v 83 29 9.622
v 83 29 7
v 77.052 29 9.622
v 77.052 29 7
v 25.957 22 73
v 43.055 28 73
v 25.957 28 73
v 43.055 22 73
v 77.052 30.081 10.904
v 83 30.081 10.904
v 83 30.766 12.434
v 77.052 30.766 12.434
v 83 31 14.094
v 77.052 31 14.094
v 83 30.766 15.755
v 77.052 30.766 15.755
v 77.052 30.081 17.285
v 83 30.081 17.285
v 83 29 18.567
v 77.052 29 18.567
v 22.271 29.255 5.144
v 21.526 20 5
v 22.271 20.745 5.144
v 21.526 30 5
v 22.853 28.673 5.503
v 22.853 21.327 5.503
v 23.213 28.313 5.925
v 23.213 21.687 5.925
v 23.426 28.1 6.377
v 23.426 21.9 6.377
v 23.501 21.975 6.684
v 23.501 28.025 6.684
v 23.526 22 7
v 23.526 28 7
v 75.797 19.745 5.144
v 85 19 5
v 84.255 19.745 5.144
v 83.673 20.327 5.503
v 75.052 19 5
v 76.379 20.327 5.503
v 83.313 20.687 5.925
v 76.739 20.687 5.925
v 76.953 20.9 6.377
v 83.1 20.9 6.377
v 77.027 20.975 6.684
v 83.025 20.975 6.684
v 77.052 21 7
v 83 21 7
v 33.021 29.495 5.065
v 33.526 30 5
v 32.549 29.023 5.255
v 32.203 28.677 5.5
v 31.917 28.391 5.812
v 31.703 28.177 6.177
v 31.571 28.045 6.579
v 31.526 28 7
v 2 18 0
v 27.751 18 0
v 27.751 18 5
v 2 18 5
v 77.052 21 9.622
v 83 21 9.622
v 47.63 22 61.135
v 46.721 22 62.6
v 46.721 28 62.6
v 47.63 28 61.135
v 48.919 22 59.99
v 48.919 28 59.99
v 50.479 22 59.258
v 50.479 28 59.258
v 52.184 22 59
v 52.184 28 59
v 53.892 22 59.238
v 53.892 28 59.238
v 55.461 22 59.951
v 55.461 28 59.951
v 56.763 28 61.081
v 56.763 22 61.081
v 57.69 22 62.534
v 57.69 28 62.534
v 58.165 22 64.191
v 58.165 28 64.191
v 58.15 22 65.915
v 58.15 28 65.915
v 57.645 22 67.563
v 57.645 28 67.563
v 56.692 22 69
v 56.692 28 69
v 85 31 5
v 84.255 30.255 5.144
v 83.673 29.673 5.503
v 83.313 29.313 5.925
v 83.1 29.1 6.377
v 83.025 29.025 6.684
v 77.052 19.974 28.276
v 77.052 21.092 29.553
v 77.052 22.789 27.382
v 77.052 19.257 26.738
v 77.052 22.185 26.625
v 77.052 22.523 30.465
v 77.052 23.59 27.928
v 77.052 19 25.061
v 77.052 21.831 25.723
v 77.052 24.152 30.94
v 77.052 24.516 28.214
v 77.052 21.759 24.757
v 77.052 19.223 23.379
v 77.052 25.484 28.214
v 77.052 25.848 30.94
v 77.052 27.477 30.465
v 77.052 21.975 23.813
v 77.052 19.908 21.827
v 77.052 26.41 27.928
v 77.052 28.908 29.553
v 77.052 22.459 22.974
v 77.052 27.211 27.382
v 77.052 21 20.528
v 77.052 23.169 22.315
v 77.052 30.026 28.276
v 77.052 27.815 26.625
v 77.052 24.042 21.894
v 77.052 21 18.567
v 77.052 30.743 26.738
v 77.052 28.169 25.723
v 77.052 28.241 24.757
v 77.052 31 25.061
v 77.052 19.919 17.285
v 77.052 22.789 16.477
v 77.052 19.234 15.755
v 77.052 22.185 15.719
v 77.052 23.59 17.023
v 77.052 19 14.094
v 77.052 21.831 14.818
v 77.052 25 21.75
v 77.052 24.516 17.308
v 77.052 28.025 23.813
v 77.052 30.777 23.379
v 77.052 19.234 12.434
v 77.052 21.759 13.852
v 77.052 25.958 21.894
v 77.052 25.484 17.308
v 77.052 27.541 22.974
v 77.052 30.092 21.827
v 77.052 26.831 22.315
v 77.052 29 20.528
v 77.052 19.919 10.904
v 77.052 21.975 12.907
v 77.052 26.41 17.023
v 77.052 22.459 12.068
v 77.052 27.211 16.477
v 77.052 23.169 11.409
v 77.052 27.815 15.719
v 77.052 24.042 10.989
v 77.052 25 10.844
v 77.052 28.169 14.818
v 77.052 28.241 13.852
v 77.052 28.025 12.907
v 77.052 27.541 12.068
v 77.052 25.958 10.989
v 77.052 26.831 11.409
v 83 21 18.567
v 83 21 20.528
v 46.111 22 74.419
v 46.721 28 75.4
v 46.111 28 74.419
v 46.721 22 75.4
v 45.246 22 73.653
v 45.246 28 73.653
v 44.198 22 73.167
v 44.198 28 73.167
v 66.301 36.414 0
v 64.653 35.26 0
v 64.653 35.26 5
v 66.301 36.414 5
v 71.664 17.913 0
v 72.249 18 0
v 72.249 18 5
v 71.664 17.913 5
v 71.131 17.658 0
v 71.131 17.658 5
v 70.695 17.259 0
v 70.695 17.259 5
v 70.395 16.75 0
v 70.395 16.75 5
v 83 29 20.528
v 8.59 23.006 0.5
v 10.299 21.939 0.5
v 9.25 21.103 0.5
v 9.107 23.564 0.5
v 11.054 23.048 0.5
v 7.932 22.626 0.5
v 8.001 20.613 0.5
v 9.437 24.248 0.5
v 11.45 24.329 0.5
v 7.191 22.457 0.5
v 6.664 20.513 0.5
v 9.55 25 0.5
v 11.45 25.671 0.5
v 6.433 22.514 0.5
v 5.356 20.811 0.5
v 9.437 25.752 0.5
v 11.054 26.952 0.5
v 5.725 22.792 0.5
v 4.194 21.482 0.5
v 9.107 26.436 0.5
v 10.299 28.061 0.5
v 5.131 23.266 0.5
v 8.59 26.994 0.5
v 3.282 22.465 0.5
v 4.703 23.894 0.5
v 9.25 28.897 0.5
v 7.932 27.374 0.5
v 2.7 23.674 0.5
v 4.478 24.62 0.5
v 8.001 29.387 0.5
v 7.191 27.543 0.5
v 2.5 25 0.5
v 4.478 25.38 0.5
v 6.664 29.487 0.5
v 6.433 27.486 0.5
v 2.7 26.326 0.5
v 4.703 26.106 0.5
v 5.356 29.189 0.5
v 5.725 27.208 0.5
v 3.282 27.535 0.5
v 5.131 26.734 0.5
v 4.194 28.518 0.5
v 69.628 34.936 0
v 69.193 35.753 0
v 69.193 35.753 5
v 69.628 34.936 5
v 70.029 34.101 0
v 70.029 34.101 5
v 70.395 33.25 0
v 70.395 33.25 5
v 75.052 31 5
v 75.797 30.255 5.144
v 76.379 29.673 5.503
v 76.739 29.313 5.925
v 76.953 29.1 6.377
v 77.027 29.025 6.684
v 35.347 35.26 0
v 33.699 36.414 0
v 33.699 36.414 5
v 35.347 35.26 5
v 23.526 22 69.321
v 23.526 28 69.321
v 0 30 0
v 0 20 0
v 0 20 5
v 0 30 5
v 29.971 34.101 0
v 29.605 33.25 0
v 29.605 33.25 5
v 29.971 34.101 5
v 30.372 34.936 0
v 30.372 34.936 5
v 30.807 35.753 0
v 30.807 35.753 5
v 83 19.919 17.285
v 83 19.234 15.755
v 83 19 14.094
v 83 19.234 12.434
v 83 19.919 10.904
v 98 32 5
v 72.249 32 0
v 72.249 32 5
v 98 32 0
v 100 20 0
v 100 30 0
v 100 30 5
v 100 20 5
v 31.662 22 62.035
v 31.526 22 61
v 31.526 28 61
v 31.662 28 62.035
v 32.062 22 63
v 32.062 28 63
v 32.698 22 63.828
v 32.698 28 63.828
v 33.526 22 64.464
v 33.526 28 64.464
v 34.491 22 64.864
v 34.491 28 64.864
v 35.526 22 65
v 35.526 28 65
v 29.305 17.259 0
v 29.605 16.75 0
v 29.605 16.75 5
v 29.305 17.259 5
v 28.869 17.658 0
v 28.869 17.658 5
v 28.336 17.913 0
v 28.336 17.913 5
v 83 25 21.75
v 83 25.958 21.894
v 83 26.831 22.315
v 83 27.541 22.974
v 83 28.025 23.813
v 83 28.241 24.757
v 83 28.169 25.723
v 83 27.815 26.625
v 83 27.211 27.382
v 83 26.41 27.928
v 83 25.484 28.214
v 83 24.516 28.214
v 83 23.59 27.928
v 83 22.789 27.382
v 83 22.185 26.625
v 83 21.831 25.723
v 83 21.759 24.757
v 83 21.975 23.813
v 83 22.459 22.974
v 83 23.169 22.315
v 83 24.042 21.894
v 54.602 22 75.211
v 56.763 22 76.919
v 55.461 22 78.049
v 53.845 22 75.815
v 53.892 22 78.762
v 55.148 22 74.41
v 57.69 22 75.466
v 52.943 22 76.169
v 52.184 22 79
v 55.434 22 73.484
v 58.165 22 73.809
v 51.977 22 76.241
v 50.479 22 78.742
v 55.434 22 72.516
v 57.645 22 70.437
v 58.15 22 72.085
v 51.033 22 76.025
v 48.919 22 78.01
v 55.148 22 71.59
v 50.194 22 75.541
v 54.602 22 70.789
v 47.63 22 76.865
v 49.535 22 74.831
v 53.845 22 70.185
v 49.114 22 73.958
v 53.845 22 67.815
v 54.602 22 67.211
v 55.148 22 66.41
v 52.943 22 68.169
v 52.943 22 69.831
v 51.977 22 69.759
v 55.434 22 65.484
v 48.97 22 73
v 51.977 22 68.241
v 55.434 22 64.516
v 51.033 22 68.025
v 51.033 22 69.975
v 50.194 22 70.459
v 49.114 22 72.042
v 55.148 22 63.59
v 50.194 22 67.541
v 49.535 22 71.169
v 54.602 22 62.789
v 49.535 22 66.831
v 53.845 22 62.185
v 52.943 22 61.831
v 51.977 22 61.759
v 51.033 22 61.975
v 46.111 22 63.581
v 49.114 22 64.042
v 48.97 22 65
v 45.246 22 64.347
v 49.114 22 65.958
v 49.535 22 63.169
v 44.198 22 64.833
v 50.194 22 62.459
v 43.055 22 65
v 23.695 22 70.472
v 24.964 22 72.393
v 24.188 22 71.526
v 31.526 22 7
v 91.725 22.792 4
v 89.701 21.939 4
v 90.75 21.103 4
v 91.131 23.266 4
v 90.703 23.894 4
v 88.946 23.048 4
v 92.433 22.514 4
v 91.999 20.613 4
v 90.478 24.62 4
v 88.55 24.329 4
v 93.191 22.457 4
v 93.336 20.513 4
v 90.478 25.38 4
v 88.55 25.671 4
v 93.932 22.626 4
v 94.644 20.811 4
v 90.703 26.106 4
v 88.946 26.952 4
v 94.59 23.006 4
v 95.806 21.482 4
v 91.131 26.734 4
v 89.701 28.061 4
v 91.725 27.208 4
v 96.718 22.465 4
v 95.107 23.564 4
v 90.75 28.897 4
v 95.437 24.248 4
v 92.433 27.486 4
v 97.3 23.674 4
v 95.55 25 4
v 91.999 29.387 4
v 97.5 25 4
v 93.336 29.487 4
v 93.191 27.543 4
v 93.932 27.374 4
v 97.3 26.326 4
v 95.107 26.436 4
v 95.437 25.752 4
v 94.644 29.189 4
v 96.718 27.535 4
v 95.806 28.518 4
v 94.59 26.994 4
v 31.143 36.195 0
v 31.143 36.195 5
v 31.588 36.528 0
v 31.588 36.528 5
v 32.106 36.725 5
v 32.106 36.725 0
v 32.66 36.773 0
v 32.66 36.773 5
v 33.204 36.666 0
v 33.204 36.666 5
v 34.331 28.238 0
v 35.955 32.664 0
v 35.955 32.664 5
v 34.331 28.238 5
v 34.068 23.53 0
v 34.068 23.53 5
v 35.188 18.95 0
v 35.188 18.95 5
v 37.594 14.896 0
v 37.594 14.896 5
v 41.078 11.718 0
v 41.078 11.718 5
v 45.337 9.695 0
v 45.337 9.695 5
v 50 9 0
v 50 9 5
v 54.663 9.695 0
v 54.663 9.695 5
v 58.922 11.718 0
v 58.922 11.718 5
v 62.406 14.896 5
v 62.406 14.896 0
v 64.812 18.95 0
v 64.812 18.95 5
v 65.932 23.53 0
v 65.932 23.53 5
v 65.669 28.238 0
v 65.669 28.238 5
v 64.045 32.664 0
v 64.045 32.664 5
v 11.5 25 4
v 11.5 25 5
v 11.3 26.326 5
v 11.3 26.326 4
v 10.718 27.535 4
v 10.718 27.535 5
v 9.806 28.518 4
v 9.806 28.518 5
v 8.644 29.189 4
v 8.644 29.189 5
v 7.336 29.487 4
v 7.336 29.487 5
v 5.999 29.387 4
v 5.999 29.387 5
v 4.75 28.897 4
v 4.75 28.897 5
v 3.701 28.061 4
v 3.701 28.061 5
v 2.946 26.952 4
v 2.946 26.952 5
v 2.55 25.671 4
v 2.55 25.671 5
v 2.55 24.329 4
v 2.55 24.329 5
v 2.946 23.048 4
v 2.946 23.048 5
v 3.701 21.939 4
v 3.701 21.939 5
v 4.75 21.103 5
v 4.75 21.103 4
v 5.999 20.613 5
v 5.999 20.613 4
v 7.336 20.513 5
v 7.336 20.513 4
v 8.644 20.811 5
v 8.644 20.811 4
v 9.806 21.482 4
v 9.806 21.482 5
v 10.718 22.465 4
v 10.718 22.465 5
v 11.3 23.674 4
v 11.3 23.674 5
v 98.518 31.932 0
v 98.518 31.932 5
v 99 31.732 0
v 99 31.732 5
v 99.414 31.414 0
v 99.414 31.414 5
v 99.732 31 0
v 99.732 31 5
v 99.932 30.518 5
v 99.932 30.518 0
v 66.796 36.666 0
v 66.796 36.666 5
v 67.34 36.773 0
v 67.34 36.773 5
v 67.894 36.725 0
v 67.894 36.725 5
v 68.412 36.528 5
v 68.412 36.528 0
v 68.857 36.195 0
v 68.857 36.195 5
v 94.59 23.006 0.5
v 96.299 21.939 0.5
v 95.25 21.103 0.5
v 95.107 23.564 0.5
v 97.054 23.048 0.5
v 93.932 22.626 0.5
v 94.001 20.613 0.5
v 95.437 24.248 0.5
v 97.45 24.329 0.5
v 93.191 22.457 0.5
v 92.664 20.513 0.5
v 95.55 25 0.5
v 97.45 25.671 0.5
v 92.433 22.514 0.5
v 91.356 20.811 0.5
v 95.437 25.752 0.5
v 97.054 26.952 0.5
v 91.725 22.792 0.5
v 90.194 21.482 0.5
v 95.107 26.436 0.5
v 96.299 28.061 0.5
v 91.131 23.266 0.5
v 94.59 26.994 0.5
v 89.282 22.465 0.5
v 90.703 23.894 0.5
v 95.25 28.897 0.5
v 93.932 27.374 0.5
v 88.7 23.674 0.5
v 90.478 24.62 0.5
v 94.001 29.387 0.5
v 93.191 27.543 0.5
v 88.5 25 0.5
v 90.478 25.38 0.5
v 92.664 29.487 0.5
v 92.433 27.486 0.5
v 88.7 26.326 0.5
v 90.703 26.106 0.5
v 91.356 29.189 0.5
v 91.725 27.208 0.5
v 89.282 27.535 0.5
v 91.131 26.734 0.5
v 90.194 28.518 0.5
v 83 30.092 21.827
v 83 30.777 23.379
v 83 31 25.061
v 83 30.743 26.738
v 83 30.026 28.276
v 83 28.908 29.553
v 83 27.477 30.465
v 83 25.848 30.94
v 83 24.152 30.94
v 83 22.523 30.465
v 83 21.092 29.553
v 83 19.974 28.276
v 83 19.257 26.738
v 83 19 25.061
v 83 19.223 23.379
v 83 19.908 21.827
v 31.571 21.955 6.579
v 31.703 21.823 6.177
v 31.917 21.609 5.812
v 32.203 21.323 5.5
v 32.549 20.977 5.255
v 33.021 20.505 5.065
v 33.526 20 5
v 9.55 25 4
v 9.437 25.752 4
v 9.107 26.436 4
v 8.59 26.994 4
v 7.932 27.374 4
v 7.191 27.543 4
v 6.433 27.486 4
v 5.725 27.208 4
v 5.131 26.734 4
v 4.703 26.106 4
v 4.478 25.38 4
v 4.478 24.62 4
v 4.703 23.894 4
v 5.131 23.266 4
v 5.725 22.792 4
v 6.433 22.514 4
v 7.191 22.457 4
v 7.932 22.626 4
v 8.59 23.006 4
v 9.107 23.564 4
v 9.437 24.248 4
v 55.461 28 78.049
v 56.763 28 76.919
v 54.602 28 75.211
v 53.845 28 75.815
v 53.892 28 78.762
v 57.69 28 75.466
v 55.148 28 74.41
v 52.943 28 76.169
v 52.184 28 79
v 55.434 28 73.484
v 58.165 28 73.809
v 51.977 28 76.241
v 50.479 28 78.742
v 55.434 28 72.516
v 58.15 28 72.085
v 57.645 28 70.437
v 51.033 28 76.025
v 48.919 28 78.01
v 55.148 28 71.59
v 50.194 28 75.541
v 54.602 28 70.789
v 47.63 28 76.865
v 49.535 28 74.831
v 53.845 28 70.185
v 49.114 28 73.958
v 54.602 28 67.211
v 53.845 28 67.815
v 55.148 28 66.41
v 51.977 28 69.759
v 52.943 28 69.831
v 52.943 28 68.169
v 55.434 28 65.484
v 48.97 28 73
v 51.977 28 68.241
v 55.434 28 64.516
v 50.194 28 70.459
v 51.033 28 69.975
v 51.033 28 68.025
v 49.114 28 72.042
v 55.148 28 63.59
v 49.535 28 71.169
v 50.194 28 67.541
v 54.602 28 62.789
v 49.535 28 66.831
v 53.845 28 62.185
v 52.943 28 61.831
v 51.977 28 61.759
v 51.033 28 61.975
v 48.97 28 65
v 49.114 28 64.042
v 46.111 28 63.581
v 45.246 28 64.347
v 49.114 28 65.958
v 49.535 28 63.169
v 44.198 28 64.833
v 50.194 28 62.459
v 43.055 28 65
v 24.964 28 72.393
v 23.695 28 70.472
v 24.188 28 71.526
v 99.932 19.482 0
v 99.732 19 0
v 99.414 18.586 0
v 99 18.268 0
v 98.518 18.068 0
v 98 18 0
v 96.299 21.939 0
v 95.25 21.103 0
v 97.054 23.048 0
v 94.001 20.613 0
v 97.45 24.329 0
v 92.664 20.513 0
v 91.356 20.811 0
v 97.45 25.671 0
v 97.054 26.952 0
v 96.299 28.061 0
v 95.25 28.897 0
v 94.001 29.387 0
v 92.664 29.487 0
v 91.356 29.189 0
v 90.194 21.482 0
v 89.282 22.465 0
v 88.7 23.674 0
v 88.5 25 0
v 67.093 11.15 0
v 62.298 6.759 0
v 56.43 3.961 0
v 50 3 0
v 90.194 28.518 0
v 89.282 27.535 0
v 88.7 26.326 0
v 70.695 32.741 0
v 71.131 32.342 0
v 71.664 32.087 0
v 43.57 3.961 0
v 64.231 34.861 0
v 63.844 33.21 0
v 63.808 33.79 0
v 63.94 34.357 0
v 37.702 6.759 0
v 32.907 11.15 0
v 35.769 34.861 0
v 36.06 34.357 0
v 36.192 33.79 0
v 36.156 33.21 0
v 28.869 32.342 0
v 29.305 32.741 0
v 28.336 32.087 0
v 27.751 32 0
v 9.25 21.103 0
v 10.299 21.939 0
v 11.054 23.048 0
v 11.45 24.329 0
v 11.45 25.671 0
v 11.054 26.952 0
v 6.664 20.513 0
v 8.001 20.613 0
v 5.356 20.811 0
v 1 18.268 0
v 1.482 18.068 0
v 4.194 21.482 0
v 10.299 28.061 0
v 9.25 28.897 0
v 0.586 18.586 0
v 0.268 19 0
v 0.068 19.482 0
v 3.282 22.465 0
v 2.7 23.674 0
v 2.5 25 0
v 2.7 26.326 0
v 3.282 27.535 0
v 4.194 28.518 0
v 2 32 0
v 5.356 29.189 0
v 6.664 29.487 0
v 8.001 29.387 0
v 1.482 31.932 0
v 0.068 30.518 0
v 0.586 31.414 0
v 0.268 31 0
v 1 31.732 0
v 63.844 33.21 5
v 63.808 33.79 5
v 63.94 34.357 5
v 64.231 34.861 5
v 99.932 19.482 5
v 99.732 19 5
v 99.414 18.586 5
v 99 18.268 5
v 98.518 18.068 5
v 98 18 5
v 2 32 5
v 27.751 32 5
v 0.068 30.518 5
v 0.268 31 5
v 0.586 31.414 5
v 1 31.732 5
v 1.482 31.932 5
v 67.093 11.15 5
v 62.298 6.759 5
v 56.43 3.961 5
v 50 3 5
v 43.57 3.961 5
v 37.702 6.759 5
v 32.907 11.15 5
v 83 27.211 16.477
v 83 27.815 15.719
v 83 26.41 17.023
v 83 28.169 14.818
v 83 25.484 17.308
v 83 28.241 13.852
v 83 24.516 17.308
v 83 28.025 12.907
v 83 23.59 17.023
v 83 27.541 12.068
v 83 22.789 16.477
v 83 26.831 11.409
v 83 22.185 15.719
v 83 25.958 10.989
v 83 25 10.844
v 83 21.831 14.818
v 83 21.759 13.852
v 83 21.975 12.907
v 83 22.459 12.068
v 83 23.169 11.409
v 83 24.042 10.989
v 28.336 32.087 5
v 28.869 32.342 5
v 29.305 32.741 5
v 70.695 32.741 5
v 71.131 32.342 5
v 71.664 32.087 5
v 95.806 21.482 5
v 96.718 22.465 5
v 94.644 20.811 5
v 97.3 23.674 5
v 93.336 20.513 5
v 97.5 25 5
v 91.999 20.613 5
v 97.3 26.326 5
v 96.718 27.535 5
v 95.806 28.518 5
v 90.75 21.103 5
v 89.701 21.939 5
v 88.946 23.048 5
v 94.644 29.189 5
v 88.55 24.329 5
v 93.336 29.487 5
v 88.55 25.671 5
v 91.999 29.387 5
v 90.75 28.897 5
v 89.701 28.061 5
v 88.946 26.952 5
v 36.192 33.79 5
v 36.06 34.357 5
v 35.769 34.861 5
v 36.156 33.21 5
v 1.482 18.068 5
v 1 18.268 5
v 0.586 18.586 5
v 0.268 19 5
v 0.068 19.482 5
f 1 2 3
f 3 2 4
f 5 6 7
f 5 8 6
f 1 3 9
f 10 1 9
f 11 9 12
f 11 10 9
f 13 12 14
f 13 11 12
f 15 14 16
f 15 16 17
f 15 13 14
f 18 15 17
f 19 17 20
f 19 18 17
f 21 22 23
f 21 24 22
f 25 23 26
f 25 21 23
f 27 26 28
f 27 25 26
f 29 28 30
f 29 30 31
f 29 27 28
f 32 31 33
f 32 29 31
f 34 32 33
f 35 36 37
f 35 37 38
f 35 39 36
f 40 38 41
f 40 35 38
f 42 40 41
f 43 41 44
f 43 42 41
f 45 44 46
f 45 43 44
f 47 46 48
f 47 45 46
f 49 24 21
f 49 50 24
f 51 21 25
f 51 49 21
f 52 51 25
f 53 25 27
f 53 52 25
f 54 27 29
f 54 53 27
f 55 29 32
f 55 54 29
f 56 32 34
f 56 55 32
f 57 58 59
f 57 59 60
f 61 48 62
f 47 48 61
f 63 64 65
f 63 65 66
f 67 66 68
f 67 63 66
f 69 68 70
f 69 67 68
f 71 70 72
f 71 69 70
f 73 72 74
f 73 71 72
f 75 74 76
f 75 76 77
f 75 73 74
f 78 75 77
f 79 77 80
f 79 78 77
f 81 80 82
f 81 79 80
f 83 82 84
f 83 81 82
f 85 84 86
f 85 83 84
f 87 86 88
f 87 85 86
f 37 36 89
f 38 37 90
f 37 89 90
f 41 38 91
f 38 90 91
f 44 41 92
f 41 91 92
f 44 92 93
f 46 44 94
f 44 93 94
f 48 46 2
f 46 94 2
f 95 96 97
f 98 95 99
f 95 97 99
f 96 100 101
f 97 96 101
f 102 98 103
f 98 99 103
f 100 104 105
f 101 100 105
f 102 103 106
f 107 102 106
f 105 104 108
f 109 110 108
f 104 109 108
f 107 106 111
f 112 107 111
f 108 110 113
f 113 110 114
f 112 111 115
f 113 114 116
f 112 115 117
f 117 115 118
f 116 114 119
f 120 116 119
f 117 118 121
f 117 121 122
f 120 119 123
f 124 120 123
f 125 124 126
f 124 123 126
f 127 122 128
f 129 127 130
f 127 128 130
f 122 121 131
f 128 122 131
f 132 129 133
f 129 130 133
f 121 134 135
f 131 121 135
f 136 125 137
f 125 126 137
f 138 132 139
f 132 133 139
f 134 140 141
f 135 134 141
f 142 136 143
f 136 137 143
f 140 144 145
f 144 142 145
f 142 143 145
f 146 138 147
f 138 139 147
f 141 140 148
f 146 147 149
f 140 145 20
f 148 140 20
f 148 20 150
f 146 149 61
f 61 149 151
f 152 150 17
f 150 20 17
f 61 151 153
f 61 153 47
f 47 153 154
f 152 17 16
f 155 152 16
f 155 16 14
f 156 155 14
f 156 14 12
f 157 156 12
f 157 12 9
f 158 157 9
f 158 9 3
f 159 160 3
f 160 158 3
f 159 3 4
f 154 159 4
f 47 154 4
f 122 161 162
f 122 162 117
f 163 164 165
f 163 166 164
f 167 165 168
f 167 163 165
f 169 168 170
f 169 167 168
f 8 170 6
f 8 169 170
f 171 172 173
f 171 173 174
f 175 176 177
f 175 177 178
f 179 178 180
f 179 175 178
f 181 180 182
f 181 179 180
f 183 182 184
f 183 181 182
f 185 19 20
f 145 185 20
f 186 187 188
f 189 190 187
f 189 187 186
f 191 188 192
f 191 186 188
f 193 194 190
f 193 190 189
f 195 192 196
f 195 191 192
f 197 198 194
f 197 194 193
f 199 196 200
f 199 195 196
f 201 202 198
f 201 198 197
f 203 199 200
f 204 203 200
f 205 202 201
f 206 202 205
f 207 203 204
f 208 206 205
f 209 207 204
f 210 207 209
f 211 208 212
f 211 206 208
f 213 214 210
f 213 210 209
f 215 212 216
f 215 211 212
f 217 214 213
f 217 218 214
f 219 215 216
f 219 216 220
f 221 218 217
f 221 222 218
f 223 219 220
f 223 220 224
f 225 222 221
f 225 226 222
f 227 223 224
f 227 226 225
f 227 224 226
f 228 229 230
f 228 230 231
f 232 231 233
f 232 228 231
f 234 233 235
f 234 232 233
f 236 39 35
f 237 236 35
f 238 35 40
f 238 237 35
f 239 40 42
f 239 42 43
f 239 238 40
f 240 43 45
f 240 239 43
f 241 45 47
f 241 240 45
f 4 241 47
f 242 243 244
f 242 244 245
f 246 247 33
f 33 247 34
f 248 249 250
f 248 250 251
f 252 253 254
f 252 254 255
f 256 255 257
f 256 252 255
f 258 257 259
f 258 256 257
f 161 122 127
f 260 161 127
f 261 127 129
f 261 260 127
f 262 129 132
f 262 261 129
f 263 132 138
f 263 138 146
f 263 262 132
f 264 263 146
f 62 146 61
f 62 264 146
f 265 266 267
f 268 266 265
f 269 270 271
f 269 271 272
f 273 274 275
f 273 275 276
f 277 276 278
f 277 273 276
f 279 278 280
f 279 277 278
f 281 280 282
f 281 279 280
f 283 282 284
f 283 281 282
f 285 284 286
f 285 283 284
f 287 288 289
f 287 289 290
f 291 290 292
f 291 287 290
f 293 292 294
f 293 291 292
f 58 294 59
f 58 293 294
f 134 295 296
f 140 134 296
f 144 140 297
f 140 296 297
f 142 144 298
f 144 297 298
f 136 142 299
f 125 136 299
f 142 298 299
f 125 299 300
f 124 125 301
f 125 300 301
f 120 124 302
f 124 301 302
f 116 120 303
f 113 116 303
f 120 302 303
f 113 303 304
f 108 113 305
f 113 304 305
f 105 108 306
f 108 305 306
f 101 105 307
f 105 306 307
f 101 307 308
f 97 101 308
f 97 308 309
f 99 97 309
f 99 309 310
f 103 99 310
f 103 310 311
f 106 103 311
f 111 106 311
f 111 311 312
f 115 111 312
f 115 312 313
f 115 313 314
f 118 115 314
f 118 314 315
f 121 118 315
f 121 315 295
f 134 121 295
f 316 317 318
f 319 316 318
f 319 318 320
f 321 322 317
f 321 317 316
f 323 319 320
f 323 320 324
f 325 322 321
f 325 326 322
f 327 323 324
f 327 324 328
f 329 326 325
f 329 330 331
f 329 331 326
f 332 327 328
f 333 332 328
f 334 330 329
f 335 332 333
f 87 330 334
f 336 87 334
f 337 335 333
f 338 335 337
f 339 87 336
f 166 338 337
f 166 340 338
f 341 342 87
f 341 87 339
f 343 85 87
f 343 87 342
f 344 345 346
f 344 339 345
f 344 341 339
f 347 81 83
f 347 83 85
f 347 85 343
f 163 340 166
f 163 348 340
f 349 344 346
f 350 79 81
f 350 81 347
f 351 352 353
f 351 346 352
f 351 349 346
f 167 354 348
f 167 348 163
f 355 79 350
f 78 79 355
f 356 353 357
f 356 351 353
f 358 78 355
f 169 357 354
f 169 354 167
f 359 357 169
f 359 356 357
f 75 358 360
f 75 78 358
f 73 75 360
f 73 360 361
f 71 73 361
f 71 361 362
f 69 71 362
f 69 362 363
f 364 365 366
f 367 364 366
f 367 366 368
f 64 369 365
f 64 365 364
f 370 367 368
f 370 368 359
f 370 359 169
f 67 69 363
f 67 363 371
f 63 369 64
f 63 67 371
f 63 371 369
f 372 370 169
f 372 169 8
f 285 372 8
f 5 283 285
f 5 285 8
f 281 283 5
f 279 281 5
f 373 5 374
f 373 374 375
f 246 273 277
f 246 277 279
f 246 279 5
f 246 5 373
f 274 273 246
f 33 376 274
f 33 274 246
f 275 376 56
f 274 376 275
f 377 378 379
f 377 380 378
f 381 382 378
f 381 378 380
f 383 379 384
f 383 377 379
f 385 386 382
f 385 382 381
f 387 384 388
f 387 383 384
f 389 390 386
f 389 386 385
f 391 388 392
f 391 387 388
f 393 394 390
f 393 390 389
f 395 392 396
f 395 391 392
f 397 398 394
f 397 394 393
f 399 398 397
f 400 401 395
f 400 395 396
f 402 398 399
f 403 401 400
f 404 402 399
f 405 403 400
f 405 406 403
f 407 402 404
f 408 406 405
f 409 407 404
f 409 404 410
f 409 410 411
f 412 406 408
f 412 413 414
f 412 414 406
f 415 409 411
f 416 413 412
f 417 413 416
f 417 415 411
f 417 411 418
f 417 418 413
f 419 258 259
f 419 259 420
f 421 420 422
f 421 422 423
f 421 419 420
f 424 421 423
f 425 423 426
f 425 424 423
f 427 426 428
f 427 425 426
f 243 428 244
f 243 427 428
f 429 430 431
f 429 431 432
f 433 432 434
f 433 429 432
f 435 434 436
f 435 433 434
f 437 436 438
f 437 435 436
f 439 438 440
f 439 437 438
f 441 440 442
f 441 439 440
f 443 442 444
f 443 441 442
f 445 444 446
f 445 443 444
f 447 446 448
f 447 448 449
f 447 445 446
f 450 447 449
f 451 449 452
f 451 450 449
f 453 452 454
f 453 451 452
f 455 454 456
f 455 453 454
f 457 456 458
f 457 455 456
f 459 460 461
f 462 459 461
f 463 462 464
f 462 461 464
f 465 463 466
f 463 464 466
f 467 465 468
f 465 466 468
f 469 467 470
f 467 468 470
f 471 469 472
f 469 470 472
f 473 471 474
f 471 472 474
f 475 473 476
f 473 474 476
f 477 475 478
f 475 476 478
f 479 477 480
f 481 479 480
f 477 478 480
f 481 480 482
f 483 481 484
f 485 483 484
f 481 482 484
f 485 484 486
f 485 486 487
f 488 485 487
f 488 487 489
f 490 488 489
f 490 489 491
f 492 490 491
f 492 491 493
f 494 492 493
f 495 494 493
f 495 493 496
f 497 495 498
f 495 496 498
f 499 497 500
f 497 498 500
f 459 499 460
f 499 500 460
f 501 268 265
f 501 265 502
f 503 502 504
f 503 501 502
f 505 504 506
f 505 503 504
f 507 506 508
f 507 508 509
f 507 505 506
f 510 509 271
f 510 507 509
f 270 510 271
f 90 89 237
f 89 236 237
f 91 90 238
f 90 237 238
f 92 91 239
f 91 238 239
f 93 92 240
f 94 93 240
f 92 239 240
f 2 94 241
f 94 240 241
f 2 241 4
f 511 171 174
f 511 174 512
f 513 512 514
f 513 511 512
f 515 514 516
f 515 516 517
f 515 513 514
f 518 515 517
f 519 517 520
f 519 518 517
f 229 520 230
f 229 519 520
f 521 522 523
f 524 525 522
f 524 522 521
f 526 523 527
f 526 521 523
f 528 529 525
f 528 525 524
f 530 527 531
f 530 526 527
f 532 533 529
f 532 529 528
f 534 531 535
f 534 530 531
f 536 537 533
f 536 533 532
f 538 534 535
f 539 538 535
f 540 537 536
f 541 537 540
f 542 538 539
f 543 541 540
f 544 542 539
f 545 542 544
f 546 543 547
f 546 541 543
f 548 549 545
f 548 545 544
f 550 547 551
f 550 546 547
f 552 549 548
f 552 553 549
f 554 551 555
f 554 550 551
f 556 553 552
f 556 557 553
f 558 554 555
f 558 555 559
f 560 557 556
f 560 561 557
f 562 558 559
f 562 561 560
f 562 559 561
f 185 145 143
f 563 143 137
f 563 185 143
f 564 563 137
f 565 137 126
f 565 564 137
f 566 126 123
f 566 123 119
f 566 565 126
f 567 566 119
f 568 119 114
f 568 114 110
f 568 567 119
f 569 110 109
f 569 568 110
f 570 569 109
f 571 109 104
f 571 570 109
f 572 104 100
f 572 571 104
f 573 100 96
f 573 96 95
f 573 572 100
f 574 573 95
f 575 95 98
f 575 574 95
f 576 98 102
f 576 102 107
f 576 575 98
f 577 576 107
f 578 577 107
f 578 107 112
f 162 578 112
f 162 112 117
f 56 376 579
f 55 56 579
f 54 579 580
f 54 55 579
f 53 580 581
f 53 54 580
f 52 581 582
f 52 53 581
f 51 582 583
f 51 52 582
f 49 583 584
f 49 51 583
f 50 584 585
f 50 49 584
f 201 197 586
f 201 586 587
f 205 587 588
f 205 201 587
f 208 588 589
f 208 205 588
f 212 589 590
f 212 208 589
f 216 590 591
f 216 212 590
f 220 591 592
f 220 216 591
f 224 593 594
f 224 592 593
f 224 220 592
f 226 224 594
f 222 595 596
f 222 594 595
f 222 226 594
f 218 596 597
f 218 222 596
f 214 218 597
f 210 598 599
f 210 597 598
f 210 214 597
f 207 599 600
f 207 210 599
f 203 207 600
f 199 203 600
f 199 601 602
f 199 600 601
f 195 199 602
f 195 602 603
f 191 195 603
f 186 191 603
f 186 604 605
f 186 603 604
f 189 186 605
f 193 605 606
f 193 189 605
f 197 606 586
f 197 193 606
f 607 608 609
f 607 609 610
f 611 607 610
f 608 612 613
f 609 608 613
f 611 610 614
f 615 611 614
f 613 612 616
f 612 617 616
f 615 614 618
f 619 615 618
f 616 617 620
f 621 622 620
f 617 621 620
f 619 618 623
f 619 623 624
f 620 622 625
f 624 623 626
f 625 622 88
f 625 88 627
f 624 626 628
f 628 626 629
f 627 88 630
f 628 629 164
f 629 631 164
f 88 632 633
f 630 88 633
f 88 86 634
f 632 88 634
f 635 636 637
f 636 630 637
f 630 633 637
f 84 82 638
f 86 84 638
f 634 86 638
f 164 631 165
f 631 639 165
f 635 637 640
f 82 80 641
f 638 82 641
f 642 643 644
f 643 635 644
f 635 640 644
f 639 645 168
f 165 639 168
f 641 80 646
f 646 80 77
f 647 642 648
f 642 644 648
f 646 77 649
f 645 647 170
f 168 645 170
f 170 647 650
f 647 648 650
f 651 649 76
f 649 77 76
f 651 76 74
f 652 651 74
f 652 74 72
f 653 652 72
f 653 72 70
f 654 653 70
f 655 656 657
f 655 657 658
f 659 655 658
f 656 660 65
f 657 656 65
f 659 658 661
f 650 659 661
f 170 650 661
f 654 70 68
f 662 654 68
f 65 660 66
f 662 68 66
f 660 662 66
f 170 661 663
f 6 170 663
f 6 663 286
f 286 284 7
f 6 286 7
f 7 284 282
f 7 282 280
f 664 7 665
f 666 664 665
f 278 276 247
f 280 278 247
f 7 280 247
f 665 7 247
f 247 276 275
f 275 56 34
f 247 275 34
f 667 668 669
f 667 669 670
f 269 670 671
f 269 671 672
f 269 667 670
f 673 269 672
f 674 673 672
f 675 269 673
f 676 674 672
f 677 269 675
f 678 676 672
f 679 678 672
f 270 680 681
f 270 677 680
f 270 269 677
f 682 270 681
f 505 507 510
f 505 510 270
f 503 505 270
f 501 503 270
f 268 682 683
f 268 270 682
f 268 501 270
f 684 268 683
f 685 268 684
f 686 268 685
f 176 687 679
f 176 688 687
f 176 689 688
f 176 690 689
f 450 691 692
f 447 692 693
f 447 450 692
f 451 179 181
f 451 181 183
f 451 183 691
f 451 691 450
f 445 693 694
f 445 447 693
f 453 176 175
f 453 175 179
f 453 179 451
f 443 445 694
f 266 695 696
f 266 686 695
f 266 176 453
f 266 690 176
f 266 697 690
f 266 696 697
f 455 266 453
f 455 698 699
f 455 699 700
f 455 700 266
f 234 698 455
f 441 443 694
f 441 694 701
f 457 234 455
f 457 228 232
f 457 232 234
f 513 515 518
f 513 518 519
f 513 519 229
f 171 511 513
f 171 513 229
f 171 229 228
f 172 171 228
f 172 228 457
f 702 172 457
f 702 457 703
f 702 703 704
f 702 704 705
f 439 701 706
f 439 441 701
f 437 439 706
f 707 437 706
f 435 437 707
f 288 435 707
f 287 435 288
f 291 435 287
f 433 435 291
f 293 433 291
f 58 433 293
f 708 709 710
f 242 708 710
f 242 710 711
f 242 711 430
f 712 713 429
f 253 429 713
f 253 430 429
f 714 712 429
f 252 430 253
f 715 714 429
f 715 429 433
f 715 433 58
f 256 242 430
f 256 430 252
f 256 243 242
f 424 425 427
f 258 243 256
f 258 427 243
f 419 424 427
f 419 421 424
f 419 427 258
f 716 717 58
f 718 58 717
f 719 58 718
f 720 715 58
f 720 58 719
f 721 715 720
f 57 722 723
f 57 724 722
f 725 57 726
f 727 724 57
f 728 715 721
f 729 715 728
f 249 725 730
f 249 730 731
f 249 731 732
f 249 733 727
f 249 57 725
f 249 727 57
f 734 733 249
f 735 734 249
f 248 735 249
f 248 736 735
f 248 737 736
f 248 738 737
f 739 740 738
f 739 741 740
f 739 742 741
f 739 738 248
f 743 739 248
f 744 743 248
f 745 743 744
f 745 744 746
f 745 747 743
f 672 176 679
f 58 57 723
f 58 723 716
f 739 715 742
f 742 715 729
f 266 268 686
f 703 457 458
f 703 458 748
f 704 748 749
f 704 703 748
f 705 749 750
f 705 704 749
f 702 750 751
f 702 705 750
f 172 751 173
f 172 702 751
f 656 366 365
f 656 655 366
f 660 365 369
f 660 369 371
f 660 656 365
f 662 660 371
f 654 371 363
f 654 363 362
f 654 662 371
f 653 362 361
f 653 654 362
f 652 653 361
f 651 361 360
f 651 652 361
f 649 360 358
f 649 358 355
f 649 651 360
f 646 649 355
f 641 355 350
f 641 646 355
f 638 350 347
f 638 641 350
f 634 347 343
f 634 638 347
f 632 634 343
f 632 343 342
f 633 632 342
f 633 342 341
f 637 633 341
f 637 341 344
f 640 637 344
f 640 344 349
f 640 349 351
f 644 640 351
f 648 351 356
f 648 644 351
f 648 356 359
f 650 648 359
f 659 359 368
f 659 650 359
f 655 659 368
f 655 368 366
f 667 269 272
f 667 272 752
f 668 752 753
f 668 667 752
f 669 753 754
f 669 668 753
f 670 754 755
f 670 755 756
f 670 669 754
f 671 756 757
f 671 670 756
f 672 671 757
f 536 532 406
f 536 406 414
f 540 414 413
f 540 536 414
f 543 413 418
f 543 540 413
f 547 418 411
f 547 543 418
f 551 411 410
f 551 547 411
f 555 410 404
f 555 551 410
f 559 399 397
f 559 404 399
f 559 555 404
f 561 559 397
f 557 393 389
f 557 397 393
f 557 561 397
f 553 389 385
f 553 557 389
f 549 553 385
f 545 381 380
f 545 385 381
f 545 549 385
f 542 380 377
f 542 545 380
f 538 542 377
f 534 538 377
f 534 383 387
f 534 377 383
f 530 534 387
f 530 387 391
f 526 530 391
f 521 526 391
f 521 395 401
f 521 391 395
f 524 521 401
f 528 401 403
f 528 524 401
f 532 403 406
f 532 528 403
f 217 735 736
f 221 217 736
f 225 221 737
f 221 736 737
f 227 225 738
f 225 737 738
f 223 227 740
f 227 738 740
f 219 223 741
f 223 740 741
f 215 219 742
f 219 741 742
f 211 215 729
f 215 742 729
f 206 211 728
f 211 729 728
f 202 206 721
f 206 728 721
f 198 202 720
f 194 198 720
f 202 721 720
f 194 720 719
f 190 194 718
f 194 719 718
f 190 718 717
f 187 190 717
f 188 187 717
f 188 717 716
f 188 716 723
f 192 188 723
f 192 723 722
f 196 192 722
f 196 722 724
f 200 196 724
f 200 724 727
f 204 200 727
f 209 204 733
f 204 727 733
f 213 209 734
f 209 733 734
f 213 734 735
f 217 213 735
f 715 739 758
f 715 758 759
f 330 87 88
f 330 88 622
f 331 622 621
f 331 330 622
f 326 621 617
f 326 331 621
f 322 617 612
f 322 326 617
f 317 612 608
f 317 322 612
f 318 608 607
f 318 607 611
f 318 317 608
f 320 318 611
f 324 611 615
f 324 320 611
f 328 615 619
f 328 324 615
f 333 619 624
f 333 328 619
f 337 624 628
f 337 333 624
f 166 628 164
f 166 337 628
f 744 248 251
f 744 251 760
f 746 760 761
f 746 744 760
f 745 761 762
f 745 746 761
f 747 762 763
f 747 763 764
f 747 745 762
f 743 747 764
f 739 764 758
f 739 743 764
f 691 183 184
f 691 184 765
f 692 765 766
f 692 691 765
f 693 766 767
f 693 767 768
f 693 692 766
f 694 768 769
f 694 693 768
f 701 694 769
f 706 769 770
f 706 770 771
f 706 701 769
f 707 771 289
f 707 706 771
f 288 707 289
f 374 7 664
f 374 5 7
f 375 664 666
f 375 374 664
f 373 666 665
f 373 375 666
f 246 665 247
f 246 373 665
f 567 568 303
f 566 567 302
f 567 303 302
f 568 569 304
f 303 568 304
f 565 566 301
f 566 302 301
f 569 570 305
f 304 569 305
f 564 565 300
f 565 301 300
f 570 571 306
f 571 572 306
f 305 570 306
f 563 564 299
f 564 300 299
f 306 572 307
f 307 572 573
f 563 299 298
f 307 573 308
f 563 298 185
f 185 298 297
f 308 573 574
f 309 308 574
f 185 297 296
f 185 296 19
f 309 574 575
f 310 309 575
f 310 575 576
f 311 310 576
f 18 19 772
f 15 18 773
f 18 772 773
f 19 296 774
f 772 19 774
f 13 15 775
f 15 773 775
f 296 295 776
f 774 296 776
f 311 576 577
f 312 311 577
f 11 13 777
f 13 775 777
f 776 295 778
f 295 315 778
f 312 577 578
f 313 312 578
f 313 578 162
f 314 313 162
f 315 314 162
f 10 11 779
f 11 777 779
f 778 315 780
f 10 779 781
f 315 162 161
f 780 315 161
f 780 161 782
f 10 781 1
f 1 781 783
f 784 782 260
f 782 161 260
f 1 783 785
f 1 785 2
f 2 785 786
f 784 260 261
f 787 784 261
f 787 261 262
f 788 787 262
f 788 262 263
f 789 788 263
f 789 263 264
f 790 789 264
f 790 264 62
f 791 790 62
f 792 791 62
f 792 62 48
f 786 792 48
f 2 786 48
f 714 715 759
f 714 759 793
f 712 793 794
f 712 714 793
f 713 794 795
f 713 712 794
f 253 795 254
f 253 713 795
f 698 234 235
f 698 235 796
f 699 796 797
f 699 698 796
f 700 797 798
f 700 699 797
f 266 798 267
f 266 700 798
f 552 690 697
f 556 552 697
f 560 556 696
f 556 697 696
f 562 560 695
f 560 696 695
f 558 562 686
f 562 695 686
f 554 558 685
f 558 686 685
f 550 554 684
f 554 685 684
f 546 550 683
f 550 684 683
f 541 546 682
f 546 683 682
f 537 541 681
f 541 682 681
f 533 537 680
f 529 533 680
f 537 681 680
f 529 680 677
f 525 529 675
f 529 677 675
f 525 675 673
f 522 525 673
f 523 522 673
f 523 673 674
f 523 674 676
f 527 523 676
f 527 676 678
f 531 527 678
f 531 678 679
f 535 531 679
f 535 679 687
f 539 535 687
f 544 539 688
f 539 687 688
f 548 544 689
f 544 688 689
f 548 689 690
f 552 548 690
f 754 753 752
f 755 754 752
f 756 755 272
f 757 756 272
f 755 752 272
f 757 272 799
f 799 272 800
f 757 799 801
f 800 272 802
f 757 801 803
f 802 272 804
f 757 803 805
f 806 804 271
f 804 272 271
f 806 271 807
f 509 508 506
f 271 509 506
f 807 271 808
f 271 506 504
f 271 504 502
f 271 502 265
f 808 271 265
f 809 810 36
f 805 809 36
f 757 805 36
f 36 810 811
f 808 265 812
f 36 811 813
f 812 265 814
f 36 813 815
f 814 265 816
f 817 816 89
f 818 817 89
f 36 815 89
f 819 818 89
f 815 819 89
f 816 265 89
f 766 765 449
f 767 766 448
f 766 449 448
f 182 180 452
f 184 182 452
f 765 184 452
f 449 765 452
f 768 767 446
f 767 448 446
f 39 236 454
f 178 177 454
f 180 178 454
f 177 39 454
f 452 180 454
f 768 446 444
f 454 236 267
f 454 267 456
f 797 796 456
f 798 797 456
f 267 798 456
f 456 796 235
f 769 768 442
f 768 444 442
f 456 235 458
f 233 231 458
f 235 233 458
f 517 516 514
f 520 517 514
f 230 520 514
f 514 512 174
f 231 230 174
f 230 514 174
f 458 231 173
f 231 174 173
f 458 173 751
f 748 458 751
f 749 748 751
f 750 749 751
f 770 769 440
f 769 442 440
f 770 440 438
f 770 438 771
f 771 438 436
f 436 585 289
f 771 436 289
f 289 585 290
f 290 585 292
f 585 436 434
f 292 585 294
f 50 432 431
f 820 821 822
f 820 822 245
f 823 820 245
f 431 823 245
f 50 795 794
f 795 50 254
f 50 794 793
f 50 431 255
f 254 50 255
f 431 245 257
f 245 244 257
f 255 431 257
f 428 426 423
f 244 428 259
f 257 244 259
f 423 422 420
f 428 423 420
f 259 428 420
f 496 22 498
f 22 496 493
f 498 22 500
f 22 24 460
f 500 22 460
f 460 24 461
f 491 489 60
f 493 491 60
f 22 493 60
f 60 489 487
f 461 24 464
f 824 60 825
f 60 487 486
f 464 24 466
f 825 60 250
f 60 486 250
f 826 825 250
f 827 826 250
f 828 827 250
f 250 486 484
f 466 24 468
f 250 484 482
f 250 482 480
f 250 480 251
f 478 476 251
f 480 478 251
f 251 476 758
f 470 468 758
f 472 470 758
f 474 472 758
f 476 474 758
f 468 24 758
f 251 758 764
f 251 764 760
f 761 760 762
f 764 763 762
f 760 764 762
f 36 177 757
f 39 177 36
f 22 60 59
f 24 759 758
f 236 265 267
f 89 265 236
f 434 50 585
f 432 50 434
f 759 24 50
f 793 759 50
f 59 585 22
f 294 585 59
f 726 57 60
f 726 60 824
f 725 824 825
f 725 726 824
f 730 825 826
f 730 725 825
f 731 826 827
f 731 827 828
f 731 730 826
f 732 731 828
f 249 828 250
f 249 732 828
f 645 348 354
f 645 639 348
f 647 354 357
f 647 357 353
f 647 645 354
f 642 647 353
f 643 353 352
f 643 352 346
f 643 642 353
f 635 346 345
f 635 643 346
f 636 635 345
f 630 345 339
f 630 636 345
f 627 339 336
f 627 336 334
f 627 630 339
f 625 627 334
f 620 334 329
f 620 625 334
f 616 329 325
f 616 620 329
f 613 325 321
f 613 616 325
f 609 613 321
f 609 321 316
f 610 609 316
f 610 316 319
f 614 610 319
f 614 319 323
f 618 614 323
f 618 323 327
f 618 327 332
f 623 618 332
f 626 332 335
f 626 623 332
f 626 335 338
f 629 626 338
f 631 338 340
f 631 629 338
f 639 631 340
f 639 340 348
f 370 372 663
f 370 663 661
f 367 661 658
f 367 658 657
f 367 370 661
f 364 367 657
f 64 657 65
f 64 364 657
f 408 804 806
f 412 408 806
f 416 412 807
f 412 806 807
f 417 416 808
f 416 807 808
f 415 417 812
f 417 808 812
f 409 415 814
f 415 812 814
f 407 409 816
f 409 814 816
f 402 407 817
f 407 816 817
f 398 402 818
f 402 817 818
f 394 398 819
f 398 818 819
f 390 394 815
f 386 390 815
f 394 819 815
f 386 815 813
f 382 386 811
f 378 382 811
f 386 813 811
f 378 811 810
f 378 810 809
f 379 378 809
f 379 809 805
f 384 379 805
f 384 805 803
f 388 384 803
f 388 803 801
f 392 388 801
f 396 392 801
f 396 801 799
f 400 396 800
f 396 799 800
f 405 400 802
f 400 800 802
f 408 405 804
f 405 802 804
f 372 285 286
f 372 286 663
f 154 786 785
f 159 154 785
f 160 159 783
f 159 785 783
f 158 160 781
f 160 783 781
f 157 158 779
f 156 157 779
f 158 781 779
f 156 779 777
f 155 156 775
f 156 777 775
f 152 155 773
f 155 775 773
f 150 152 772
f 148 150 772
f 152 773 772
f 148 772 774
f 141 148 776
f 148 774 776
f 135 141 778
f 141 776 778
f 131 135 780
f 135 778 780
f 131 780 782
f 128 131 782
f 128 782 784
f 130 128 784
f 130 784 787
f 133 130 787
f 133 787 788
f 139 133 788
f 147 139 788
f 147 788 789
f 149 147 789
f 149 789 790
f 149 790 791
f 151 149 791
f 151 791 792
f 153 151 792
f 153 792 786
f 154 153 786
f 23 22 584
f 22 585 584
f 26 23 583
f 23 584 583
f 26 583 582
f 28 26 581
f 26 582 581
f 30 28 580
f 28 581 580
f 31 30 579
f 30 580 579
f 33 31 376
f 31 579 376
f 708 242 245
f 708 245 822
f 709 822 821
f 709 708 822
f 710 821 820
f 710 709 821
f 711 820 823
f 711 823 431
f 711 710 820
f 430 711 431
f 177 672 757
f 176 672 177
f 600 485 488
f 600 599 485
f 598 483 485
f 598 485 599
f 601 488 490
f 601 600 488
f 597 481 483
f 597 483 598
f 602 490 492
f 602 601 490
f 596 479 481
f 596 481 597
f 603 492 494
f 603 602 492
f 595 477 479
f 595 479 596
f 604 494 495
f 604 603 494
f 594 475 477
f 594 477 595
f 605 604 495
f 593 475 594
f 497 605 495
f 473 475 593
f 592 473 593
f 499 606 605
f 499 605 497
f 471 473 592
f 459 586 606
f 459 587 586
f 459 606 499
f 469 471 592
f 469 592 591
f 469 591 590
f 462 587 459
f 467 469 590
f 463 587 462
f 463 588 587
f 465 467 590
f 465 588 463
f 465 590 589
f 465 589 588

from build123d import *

# Parameters (mm, degrees)
SKETCH1_R                = 2.55
BOSS_EXTRUDE1_DEPTH      = 5
SKETCH4_R                = 4.5
CUT_EXTRUDE2_DEPTH       = 1
SKETCH6_W                = 5.947651005
SKETCH6_H                = 20
BOSS_EXTRUDE2_DEPTH      = 4
BOSS_EXTRUDE2_DEPTH_BACK = 4
SKETCH11_R               = 4.5
CUT_EXTRUDE3_DEPTH       = 0.5
SKETCH16_R               = 3.25
BOSS_EXTRUDE3_DEPTH      = 3
BOSS_EXTRUDE3_DEPTH_BACK = 3
FILLET3_R                = 2
BOSS_EXTRUDE4_DEPTH      = 5.947651
CUT_EXTRUDE5_REACH       = 85
SKETCH18_R               = 3.25


with BuildPart() as part:
    # Sketch1 → Boss-Extrude1 (new body)
    with BuildSketch(Plane.XY):
        with BuildLine():
            Line((100, 25), (100, 20))
            ThreePointArc((100, 20), (99.414213562, 18.585786438), (98, 18))
            Line((98, 18), (72.248595461, 18))
            ThreePointArc((72.248595461, 18), (71.130561473, 17.658312395), (70.39454584, 16.75))
            ThreePointArc((70.39454584, 16.75), (50, 3), (29.60545416, 16.75))
            ThreePointArc((29.60545416, 16.75), (28.869438527, 17.658312395), (27.751404539, 18))
            Line((27.751404539, 18), (2, 18))
            ThreePointArc((2, 18), (0.585786438, 18.585786438), (0, 20))
            Line((0, 20), (0, 25))
            Line((0, 25), (0, 30))
            ThreePointArc((0, 30), (0.585786438, 31.414213562), (2, 32))
            Line((2, 32), (21.056240945, 32))
            Line((21.056240945, 32), (27.751404539, 32))
            ThreePointArc((27.751404539, 32), (28.869438527, 32.341687605), (29.60545416, 33.25))
            ThreePointArc((29.60545416, 33.25), (30.166752838, 34.520625347), (30.807119991, 35.753295167))
            ThreePointArc((30.807119991, 35.753295167), (32.106461975, 36.725482012), (33.699080137, 36.414026968))
            Line((33.699080137, 36.414026968), (35.34656276, 35.260447216))
            ThreePointArc((35.34656276, 35.260447216), (36.146649881, 34.078494315), (35.955031011, 32.664127224))
            ThreePointArc((35.955031011, 32.664127224), (50, 9), (64.044968989, 32.664127224))
            ThreePointArc((64.044968989, 32.664127224), (63.853350119, 34.078494315), (64.65343724, 35.260447216))
            Line((64.65343724, 35.260447216), (66.300919863, 36.414026968))
            ThreePointArc((66.300919863, 36.414026968), (67.893538025, 36.725482012), (69.192880009, 35.753295167))
            ThreePointArc((69.192880009, 35.753295167), (69.833247162, 34.520625347), (70.39454584, 33.25))
            ThreePointArc((70.39454584, 33.25), (71.130561473, 32.341687605), (72.248595461, 32))
            Line((72.248595461, 32), (78.943759055, 32))
            Line((78.943759055, 32), (98, 32))
            ThreePointArc((98, 32), (99.414213562, 31.414213562), (100, 30))
            Line((100, 30), (100, 25))
        make_face()
        with Locations((93, 25)):
            Circle(SKETCH1_R, mode=Mode.SUBTRACT)
        with Locations((7, 25)):
            Circle(SKETCH1_R, mode=Mode.SUBTRACT)
    extrude(amount=BOSS_EXTRUDE1_DEPTH)

    # Sketch4 → Cut-Extrude2 (cut)
    with BuildSketch(Plane.XY.offset(5)):
        with Locations((93, 25)):
            Circle(SKETCH4_R)
        with Locations((7, 25)):
            Circle(SKETCH4_R)
    extrude(amount=-CUT_EXTRUDE2_DEPTH, mode=Mode.SUBTRACT)

    # Sketch6 → Boss-Extrude2 (add, two sides)
    with BuildSketch(Plane(origin=(0, 25, 0), x_dir=(-1, 0, 0), z_dir=(0, -1, 0))) as boss_extrude2_sk:
        with Locations((-80.026174497, -15)):
            Rectangle(SKETCH6_W, SKETCH6_H)
    extrude(amount=BOSS_EXTRUDE2_DEPTH)
    extrude(boss_extrude2_sk.sketch, amount=-BOSS_EXTRUDE2_DEPTH_BACK)

    # Sketch11 → Cut-Extrude3 (cut)
    with BuildSketch(Plane(origin=(0, 0, 0), x_dir=(-1, 0, 0), z_dir=(0, 0, -1))):
        with Locations((-93, 25)):
            Circle(SKETCH11_R)
        with Locations((-7, 25)):
            Circle(SKETCH11_R)
    extrude(amount=-CUT_EXTRUDE3_DEPTH, mode=Mode.SUBTRACT)

    # Sketch16 → Boss-Extrude3 (add, two sides)
    with BuildSketch(Plane(origin=(0, 25, 0), x_dir=(-1, 0, 0), z_dir=(0, -1, 0))) as boss_extrude3_sk:
        with BuildLine():
            Line((-31.525983958, -5), (-31.525983958, -48.851508305))
            Line((-31.525983958, -48.851508305), (-31.525983958, -61))
            ThreePointArc((-31.525983958, -61), (-32.697556833, -63.828427125), (-35.525983958, -65))
            Line((-35.525983958, -65), (-43.054928699, -65))
            ThreePointArc((-43.054928699, -65), (-45.245818929, -64.346640106), (-46.720989255, -62.6))
            ThreePointArc((-46.720989255, -62.6), (-55.461014998, -59.950609847), (-56.692216044, -69))
            ThreePointArc((-56.692216044, -69), (-55.461014998, -78.049390153), (-46.720989255, -75.4))
            ThreePointArc((-46.720989255, -75.4), (-45.245818929, -73.653359894), (-43.054928699, -73))
            Line((-43.054928699, -73), (-25.956550891, -73))
            ThreePointArc((-25.956550891, -73), (-24.188489968, -71.525548017), (-23.525983958, -69.320750097))
            Line((-23.525983958, -69.320750097), (-23.525983958, -5))
            Line((-23.525983958, -5), (-31.525983958, -5))
        make_face()
        with Locations((-52.220080089, -73)):
            Circle(SKETCH16_R, mode=Mode.SUBTRACT)
        with Locations((-52.220080089, -65)):
            Circle(SKETCH16_R, mode=Mode.SUBTRACT)
    extrude(amount=BOSS_EXTRUDE3_DEPTH)
    extrude(boss_extrude3_sk.sketch, amount=-BOSS_EXTRUDE3_DEPTH_BACK)

    # Fillet3
    fillet3_edges = [part.edges().sort_by_distance(p)[0] for p in [
        (83, 25, 5),
        (80.026174498, 29, 5),
        (77.052348995, 25, 5),
        (80.026174498, 21, 5),
        (31.525983958, 25, 5),
        (27.525983958, 28, 5),
        (23.525983958, 25, 5),
        (27.525983958, 22, 5),
    ]]
    fillet(fillet3_edges, radius=FILLET3_R)

    # Sketch17 → Boss-Extrude4 (add)
    with BuildSketch(Plane(origin=(83, 0, 0), x_dir=(0, 0, -1), z_dir=(1, 0, 0))):
        with BuildLine():
            ThreePointArc((-19.547210182, 27.503414308), (-31, 25), (-19.547210182, 22.496585692))
            ThreePointArc((-19.547210182, 22.496585692), (-8.094420363, 25), (-19.547210182, 27.503414308))
        make_face()
    extrude(amount=-BOSS_EXTRUDE4_DEPTH)

    # Sketch18 → Cut-Extrude5 (cut, up to next)
    with BuildSketch(Plane(origin=(83, 0, 0), x_dir=(0, 0, -1), z_dir=(1, 0, 0)), mode=Mode.PRIVATE) as cut_extrude5_sk1:
        with Locations((-25, 25)):
            Circle(SKETCH18_R)
    cut_extrude5_tool1 = extrude(cut_extrude5_sk1.sketch, amount=-CUT_EXTRUDE5_REACH, mode=Mode.PRIVATE) & part.part
    add(cut_extrude5_tool1.solids().sort_by_distance((83, 25, 25))[0], mode=Mode.SUBTRACT)
    # Sketch18 → Cut-Extrude5 (cut, up to next)
    with BuildSketch(Plane(origin=(83, 0, 0), x_dir=(0, 0, -1), z_dir=(1, 0, 0)), mode=Mode.PRIVATE) as cut_extrude5_sk2:
        with Locations((-14.094420363, 25)):
            Circle(SKETCH18_R)
    cut_extrude5_tool2 = extrude(cut_extrude5_sk2.sketch, amount=-CUT_EXTRUDE5_REACH, mode=Mode.PRIVATE) & part.part
    add(cut_extrude5_tool2.solids().sort_by_distance((83, 25, 14.09442))[0], mode=Mode.SUBTRACT)


solid = part.part
